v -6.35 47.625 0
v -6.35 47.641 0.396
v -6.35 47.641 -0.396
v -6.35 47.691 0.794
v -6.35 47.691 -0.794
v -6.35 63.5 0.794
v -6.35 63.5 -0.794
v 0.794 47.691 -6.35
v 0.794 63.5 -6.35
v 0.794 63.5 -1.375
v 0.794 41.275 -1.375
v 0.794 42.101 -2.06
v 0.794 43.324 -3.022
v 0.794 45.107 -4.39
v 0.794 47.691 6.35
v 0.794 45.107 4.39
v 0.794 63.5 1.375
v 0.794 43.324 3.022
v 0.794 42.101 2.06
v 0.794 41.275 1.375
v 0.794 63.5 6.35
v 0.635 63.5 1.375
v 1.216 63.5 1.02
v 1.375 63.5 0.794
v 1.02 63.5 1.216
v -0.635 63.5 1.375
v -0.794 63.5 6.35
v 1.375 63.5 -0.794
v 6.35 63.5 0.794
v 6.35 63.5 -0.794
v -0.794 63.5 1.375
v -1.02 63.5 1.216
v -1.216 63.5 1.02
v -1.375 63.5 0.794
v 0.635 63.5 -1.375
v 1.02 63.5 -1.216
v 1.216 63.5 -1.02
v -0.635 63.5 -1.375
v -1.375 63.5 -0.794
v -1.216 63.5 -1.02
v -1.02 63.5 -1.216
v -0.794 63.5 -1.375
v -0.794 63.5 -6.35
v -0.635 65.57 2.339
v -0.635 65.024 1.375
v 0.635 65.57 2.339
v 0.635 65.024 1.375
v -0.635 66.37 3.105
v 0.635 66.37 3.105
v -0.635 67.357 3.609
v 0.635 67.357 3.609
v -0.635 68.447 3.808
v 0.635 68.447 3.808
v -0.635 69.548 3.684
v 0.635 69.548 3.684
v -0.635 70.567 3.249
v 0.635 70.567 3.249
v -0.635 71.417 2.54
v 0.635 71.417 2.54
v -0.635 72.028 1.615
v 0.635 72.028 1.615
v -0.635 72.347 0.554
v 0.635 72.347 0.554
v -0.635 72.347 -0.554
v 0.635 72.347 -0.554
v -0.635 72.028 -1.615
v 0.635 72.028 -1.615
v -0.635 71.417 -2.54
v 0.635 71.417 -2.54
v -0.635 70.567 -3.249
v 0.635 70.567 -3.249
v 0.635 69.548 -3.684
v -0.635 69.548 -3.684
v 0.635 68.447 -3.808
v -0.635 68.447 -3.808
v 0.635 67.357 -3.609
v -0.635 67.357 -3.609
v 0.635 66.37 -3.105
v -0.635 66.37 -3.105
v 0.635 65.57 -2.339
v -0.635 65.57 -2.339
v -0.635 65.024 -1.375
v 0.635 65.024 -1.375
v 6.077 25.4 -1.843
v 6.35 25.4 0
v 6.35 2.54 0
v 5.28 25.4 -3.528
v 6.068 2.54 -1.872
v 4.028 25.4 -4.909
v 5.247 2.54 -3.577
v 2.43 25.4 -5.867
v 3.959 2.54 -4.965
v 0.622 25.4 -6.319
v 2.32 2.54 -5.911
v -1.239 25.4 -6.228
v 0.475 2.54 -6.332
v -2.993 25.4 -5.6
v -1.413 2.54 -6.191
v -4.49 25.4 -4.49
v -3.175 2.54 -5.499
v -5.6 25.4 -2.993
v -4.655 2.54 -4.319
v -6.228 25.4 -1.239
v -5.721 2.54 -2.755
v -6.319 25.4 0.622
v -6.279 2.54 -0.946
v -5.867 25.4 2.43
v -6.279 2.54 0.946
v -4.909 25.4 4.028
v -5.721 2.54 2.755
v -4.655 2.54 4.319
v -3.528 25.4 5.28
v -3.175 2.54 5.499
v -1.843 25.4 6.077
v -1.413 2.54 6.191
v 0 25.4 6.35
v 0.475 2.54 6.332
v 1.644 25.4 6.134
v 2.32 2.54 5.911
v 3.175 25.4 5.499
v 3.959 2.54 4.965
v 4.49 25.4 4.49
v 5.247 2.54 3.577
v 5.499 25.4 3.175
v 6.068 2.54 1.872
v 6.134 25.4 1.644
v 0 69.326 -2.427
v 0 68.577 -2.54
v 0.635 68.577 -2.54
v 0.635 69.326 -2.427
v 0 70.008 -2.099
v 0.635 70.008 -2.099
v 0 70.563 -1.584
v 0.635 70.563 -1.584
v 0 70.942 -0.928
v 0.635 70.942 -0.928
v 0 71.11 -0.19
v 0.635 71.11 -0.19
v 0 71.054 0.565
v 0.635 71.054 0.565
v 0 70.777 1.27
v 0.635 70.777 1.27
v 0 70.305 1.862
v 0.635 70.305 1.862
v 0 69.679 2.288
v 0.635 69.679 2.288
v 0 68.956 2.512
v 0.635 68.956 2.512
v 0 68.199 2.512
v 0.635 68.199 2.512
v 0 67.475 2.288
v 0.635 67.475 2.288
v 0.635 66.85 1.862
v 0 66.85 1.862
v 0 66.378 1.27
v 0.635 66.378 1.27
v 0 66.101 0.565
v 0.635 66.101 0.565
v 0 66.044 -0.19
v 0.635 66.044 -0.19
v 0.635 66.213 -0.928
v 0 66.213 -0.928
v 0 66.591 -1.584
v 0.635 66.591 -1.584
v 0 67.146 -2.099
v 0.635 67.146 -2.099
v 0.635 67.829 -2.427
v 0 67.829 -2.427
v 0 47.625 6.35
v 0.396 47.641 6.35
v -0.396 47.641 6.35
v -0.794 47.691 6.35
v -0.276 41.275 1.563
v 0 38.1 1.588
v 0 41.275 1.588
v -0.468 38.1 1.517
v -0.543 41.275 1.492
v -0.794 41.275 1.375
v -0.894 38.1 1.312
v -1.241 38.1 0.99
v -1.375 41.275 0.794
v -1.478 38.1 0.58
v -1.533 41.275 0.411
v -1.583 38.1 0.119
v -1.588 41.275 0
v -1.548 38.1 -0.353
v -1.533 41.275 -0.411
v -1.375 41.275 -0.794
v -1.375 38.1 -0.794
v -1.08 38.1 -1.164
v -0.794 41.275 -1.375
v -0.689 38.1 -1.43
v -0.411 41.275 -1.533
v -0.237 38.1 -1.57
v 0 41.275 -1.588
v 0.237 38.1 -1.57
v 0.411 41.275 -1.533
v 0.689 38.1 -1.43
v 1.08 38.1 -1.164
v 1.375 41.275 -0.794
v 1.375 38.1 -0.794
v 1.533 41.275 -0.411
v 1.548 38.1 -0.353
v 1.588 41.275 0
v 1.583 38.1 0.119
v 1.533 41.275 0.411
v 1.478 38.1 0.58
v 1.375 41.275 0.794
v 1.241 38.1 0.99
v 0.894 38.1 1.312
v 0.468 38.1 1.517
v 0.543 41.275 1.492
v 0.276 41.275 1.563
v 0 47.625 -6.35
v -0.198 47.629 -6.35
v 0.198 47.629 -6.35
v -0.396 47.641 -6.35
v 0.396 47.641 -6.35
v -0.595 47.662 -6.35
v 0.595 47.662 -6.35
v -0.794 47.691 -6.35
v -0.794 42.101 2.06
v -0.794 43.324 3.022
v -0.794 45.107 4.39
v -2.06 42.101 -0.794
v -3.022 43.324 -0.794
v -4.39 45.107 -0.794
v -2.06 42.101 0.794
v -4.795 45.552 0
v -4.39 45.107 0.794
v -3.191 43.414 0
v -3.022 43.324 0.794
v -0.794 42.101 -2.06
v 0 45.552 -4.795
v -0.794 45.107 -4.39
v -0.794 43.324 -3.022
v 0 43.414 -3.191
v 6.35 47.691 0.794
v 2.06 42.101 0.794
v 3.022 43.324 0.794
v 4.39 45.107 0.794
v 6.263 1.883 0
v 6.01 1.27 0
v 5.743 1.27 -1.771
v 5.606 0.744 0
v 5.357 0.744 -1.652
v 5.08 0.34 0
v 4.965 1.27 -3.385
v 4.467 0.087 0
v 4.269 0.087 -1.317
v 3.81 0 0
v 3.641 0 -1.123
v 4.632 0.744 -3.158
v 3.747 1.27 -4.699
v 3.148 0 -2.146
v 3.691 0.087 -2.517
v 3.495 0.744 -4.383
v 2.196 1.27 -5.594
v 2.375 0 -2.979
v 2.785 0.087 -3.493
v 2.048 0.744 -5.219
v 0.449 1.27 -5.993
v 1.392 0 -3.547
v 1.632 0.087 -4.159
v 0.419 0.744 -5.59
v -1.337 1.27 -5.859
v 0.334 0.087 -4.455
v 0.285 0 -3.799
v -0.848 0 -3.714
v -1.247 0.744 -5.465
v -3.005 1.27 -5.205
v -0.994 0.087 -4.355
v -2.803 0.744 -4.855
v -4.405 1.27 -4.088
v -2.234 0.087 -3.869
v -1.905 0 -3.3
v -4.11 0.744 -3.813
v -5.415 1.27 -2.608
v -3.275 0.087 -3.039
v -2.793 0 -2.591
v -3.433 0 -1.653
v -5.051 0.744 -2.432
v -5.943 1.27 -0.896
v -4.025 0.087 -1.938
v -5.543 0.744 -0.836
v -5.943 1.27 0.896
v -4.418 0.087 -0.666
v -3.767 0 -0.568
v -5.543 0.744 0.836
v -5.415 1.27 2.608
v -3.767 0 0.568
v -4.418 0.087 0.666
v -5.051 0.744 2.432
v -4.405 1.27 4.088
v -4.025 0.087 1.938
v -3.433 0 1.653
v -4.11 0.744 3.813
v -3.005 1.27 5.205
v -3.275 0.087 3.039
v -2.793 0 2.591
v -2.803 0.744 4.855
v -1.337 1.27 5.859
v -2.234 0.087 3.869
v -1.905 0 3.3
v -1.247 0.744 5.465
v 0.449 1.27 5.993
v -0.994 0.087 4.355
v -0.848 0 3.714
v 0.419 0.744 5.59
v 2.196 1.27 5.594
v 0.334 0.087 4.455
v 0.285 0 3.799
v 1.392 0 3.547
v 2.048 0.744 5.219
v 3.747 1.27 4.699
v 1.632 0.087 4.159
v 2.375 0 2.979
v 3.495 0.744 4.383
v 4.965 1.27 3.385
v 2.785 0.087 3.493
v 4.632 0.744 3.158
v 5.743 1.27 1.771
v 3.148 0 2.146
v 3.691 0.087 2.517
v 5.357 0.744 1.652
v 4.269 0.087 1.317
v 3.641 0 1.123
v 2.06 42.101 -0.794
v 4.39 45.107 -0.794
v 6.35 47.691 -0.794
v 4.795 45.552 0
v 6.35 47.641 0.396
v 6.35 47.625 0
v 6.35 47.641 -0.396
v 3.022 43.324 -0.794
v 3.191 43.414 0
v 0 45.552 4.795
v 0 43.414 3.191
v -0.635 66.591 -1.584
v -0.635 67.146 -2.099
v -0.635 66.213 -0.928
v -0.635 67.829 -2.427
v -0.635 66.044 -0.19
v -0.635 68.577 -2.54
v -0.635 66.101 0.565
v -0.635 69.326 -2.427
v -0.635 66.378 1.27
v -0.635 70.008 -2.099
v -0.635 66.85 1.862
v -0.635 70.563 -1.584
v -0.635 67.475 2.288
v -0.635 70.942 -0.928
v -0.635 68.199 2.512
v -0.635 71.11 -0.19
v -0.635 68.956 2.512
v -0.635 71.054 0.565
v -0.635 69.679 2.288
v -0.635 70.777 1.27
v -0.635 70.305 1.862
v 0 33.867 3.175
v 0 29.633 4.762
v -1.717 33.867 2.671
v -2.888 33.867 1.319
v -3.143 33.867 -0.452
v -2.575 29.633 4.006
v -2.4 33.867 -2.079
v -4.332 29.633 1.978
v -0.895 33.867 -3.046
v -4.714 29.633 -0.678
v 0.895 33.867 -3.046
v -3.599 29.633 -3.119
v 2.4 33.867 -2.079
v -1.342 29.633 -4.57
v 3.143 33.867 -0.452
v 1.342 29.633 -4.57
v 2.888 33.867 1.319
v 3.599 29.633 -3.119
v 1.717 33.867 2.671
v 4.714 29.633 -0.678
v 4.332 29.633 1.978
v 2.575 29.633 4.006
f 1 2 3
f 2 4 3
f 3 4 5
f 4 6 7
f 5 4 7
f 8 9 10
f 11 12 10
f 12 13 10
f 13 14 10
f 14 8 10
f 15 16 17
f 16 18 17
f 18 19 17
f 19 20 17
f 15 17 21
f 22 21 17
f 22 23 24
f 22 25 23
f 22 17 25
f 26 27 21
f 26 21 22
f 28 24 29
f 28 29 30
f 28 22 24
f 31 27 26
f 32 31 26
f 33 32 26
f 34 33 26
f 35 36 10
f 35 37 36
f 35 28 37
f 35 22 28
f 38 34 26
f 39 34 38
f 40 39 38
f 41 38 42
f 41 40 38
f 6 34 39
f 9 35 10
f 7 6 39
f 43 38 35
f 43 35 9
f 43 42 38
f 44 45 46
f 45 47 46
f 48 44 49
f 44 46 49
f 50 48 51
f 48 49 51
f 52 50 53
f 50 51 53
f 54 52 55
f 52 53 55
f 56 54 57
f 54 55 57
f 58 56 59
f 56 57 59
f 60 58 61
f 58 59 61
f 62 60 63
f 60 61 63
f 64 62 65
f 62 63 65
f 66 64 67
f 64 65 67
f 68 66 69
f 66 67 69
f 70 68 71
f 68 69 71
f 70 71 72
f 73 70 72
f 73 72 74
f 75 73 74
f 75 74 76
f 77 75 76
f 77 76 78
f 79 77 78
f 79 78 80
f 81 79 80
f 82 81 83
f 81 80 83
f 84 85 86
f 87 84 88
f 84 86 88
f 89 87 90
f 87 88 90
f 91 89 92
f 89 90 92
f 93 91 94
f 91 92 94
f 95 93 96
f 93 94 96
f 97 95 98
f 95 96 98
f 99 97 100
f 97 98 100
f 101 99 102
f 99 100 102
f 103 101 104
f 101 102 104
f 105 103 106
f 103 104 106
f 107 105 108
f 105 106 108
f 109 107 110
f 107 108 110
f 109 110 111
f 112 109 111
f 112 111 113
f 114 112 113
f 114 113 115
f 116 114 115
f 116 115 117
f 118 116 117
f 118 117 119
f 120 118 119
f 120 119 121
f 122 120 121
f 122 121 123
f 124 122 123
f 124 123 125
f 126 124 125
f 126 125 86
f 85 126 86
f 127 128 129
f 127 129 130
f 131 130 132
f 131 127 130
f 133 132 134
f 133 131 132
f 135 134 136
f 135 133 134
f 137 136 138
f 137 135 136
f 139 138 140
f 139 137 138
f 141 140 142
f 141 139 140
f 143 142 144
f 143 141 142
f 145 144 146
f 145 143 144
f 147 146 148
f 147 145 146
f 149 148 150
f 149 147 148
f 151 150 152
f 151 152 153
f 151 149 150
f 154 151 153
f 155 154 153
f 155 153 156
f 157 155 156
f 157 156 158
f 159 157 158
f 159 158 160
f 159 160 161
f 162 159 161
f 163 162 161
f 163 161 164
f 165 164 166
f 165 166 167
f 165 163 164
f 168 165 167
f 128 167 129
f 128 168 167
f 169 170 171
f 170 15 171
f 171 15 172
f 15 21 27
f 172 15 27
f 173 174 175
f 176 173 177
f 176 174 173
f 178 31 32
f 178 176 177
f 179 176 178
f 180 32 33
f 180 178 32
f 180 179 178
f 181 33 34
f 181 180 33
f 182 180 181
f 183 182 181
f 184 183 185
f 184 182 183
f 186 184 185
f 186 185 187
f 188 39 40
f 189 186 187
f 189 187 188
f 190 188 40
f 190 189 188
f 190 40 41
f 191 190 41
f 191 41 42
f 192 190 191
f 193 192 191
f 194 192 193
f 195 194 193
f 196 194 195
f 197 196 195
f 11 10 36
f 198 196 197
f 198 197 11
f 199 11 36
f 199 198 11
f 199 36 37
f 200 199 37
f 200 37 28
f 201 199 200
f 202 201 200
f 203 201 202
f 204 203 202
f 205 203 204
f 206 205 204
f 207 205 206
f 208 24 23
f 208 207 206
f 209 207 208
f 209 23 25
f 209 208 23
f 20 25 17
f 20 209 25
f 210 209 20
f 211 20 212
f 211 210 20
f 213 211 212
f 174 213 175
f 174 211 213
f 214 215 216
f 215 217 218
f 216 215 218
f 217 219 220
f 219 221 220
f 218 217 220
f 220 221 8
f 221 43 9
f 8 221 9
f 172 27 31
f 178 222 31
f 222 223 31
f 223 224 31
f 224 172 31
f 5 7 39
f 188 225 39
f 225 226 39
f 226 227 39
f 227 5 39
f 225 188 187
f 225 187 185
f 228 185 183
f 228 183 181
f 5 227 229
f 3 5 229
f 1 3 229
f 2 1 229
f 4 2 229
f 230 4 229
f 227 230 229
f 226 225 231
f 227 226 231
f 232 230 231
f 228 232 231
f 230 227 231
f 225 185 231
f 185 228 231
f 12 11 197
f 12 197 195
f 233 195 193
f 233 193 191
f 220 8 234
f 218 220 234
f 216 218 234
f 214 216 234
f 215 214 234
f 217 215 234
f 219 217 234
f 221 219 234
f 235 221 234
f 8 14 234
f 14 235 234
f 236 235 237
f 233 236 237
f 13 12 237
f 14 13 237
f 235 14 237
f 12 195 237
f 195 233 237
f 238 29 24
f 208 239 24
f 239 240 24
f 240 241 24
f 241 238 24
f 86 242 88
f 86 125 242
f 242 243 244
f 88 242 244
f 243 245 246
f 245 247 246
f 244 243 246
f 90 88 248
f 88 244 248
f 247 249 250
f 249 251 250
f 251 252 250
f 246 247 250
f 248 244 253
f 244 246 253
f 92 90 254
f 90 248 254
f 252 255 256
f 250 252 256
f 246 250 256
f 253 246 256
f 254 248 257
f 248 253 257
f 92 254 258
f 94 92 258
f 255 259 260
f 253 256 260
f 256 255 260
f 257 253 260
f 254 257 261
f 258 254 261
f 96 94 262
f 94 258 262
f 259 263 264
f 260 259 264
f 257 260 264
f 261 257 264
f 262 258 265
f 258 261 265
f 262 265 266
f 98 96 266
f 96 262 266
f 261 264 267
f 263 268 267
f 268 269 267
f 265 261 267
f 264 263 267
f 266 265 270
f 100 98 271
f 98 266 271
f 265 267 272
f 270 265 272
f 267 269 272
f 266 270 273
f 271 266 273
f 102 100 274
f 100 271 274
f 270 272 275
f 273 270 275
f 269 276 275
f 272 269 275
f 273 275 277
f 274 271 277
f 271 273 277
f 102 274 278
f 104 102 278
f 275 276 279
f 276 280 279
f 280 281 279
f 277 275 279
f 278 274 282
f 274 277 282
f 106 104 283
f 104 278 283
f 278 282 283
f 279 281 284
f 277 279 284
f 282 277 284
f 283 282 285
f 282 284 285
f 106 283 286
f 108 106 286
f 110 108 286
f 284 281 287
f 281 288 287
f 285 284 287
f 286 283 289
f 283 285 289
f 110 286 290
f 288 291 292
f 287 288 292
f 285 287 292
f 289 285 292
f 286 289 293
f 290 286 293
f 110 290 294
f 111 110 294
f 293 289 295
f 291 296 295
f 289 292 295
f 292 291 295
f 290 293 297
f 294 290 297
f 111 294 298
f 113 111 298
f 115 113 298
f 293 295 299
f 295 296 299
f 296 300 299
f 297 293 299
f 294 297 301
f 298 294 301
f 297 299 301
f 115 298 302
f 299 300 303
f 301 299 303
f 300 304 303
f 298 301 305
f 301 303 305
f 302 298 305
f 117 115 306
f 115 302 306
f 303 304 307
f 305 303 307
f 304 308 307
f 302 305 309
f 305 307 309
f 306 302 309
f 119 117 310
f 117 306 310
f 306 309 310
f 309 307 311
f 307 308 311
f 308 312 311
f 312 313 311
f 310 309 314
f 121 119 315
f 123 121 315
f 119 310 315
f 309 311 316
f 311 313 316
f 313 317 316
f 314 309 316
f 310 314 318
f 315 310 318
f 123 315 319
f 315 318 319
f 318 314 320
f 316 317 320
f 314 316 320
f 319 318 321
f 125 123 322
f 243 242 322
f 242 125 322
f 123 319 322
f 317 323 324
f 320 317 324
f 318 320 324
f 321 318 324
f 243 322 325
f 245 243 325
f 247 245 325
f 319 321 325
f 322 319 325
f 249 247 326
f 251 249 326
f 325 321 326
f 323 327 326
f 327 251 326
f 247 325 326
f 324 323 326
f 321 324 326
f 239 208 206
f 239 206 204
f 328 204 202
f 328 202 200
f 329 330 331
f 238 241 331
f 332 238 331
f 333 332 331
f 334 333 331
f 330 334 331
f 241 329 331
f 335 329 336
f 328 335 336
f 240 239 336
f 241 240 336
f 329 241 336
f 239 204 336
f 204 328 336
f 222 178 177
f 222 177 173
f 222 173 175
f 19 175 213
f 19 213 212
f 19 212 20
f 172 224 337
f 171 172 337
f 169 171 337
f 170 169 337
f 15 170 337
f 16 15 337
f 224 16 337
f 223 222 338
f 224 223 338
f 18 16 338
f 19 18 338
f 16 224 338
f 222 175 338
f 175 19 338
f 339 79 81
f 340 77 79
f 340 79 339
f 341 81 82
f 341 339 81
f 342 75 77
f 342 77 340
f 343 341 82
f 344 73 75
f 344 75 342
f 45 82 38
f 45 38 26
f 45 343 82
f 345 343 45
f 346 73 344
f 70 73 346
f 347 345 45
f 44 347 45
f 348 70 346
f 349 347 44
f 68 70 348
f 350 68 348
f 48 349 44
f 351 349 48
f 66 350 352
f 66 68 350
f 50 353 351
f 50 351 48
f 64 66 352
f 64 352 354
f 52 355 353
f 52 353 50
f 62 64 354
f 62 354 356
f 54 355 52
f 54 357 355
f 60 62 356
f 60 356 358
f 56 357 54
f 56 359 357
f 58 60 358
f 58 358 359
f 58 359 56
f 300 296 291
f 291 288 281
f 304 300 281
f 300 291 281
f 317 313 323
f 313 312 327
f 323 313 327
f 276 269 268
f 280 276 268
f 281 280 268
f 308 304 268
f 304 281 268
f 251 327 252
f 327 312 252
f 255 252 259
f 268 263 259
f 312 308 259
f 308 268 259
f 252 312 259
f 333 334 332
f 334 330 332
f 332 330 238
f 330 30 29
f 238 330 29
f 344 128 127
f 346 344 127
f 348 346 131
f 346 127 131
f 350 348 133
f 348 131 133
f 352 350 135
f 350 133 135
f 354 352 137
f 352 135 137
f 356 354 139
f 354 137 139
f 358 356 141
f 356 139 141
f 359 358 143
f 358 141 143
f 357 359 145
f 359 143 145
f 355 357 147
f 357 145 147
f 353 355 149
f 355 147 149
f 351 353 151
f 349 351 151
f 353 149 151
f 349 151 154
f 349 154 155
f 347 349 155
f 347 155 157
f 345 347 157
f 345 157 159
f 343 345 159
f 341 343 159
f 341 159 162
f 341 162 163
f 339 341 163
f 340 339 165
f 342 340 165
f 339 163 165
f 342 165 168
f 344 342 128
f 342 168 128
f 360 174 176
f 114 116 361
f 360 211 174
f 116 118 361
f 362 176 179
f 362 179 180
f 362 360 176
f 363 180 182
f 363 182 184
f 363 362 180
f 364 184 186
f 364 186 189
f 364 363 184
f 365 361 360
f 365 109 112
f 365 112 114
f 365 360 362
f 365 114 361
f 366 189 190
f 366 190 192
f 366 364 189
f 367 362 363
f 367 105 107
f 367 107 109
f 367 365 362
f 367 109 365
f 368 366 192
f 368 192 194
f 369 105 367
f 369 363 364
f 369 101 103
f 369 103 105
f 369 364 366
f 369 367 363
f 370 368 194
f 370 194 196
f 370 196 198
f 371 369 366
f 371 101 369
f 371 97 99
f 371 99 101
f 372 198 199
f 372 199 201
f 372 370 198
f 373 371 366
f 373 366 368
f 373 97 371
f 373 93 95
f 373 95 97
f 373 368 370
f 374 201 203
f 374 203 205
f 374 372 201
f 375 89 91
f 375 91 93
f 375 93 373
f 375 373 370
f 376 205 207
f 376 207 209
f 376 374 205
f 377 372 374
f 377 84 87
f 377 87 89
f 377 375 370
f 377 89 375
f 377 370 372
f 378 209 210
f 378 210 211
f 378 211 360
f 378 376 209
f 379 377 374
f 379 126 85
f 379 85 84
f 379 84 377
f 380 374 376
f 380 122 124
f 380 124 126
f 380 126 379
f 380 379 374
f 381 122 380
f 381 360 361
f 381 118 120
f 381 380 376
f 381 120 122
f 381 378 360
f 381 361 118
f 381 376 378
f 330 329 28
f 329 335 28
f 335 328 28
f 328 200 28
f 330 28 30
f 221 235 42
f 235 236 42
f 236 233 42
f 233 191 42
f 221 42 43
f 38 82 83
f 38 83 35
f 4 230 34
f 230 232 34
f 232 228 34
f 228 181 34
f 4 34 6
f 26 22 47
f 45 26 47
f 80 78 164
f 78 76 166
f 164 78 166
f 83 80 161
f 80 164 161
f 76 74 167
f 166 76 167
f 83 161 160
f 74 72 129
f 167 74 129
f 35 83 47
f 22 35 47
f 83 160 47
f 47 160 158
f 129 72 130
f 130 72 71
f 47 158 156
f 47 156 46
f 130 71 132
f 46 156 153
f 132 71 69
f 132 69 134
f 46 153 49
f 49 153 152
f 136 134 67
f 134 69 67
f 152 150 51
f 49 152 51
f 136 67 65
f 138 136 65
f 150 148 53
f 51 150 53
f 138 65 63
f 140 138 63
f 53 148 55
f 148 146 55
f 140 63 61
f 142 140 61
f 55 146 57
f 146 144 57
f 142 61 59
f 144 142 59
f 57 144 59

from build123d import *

# Parameters (mm, degrees)
SKETCH1_R           = 6.35
EXTRUDE1_DEPTH      = 25.4
FILLET1_R           = 2.54
EXTRUDE2_DEPTH      = 22.225
SKETCH9_R           = 2.54
EXTRUDE3_DEPTH      = 0.635
EXTRUDE3_DEPTH_BACK = 0.635


with BuildPart() as part:
    # Sketch1 → Extrude1 (new body)
    with BuildSketch(Plane(origin=(0, 0, 0), x_dir=(1, 0, 0), z_dir=(0, 1, 0))):
        Circle(SKETCH1_R)
    extrude(amount=EXTRUDE1_DEPTH)

    # Fillet1
    fillet1_edges = [part.edges().sort_by_distance(p)[0] for p in [
        (-6.35, 0, 0),
    ]]
    fillet(fillet1_edges, radius=FILLET1_R)

    # Sketch2 → Revolve1 (revolve)
    with BuildSketch(Plane(origin=(0, 0, 0), x_dir=(0, 0, -1), z_dir=(1, 0, 0))):
        Polygon((-6.35, 25.4), (0, 25.4), (0, 63.5), (-1.5875, 63.5), (-1.5875, 38.1), align=None)
    revolve(axis=Axis((0, 66.595768823, 0), (0, -1, 0)))

    # Sketch3 → Extrude2 (add)
    with BuildSketch(Plane(origin=(0, 63.5, 0), x_dir=(-1, 0, 0), z_dir=(0, 1, 0))):
        Polygon((0.79375, -0.79375), (0.79375, -6.35), (-0.79375, -6.35), (-0.79375, -0.79375), (-6.35, -0.79375), (-6.35, 0.79375), (-0.79375, 0.79375), (-0.79375, 6.35), (0.79375, 6.35), (0.79375, 0.79375), (6.35, 0.79375), (6.35, -0.79375), align=None)
    extrude(amount=-EXTRUDE2_DEPTH)

    # Sketch7 → Cut-Revolve5 (revolve, cut)
    with BuildSketch(Plane(origin=(0, 0, 0), x_dir=(0, 0, -1), z_dir=(1, 0, 0))):
        Polygon((7.438341529, 49.076122039), (1.5875, 41.275), (7.438341529, 41.275), align=None)
    revolve(axis=Axis((0, 0, 0), (0, 1, 0)), mode=Mode.SUBTRACT)

    # Sketch9 → Extrude3 (add, two sides)
    with BuildSketch(Plane(origin=(0, 0, 0), x_dir=(0, 0, -1), z_dir=(1, 0, 0))) as extrude3_sk:
        with BuildLine():
            Line((-1.374815329, 63.5), (-1.374815329, 65.024))
            ThreePointArc((-1.374815329, 65.024), (0, 72.387305899), (1.374815329, 65.024))
            Line((1.374815329, 65.024), (1.374815329, 63.5))
            Line((1.374815329, 63.5), (-1.374815329, 63.5))
        make_face()
        with Locations((0, 68.577305899)):
            Circle(SKETCH9_R, mode=Mode.SUBTRACT)
    extrude(amount=EXTRUDE3_DEPTH)
    extrude(extrude3_sk.sketch, amount=-EXTRUDE3_DEPTH_BACK)


solid = part.part
